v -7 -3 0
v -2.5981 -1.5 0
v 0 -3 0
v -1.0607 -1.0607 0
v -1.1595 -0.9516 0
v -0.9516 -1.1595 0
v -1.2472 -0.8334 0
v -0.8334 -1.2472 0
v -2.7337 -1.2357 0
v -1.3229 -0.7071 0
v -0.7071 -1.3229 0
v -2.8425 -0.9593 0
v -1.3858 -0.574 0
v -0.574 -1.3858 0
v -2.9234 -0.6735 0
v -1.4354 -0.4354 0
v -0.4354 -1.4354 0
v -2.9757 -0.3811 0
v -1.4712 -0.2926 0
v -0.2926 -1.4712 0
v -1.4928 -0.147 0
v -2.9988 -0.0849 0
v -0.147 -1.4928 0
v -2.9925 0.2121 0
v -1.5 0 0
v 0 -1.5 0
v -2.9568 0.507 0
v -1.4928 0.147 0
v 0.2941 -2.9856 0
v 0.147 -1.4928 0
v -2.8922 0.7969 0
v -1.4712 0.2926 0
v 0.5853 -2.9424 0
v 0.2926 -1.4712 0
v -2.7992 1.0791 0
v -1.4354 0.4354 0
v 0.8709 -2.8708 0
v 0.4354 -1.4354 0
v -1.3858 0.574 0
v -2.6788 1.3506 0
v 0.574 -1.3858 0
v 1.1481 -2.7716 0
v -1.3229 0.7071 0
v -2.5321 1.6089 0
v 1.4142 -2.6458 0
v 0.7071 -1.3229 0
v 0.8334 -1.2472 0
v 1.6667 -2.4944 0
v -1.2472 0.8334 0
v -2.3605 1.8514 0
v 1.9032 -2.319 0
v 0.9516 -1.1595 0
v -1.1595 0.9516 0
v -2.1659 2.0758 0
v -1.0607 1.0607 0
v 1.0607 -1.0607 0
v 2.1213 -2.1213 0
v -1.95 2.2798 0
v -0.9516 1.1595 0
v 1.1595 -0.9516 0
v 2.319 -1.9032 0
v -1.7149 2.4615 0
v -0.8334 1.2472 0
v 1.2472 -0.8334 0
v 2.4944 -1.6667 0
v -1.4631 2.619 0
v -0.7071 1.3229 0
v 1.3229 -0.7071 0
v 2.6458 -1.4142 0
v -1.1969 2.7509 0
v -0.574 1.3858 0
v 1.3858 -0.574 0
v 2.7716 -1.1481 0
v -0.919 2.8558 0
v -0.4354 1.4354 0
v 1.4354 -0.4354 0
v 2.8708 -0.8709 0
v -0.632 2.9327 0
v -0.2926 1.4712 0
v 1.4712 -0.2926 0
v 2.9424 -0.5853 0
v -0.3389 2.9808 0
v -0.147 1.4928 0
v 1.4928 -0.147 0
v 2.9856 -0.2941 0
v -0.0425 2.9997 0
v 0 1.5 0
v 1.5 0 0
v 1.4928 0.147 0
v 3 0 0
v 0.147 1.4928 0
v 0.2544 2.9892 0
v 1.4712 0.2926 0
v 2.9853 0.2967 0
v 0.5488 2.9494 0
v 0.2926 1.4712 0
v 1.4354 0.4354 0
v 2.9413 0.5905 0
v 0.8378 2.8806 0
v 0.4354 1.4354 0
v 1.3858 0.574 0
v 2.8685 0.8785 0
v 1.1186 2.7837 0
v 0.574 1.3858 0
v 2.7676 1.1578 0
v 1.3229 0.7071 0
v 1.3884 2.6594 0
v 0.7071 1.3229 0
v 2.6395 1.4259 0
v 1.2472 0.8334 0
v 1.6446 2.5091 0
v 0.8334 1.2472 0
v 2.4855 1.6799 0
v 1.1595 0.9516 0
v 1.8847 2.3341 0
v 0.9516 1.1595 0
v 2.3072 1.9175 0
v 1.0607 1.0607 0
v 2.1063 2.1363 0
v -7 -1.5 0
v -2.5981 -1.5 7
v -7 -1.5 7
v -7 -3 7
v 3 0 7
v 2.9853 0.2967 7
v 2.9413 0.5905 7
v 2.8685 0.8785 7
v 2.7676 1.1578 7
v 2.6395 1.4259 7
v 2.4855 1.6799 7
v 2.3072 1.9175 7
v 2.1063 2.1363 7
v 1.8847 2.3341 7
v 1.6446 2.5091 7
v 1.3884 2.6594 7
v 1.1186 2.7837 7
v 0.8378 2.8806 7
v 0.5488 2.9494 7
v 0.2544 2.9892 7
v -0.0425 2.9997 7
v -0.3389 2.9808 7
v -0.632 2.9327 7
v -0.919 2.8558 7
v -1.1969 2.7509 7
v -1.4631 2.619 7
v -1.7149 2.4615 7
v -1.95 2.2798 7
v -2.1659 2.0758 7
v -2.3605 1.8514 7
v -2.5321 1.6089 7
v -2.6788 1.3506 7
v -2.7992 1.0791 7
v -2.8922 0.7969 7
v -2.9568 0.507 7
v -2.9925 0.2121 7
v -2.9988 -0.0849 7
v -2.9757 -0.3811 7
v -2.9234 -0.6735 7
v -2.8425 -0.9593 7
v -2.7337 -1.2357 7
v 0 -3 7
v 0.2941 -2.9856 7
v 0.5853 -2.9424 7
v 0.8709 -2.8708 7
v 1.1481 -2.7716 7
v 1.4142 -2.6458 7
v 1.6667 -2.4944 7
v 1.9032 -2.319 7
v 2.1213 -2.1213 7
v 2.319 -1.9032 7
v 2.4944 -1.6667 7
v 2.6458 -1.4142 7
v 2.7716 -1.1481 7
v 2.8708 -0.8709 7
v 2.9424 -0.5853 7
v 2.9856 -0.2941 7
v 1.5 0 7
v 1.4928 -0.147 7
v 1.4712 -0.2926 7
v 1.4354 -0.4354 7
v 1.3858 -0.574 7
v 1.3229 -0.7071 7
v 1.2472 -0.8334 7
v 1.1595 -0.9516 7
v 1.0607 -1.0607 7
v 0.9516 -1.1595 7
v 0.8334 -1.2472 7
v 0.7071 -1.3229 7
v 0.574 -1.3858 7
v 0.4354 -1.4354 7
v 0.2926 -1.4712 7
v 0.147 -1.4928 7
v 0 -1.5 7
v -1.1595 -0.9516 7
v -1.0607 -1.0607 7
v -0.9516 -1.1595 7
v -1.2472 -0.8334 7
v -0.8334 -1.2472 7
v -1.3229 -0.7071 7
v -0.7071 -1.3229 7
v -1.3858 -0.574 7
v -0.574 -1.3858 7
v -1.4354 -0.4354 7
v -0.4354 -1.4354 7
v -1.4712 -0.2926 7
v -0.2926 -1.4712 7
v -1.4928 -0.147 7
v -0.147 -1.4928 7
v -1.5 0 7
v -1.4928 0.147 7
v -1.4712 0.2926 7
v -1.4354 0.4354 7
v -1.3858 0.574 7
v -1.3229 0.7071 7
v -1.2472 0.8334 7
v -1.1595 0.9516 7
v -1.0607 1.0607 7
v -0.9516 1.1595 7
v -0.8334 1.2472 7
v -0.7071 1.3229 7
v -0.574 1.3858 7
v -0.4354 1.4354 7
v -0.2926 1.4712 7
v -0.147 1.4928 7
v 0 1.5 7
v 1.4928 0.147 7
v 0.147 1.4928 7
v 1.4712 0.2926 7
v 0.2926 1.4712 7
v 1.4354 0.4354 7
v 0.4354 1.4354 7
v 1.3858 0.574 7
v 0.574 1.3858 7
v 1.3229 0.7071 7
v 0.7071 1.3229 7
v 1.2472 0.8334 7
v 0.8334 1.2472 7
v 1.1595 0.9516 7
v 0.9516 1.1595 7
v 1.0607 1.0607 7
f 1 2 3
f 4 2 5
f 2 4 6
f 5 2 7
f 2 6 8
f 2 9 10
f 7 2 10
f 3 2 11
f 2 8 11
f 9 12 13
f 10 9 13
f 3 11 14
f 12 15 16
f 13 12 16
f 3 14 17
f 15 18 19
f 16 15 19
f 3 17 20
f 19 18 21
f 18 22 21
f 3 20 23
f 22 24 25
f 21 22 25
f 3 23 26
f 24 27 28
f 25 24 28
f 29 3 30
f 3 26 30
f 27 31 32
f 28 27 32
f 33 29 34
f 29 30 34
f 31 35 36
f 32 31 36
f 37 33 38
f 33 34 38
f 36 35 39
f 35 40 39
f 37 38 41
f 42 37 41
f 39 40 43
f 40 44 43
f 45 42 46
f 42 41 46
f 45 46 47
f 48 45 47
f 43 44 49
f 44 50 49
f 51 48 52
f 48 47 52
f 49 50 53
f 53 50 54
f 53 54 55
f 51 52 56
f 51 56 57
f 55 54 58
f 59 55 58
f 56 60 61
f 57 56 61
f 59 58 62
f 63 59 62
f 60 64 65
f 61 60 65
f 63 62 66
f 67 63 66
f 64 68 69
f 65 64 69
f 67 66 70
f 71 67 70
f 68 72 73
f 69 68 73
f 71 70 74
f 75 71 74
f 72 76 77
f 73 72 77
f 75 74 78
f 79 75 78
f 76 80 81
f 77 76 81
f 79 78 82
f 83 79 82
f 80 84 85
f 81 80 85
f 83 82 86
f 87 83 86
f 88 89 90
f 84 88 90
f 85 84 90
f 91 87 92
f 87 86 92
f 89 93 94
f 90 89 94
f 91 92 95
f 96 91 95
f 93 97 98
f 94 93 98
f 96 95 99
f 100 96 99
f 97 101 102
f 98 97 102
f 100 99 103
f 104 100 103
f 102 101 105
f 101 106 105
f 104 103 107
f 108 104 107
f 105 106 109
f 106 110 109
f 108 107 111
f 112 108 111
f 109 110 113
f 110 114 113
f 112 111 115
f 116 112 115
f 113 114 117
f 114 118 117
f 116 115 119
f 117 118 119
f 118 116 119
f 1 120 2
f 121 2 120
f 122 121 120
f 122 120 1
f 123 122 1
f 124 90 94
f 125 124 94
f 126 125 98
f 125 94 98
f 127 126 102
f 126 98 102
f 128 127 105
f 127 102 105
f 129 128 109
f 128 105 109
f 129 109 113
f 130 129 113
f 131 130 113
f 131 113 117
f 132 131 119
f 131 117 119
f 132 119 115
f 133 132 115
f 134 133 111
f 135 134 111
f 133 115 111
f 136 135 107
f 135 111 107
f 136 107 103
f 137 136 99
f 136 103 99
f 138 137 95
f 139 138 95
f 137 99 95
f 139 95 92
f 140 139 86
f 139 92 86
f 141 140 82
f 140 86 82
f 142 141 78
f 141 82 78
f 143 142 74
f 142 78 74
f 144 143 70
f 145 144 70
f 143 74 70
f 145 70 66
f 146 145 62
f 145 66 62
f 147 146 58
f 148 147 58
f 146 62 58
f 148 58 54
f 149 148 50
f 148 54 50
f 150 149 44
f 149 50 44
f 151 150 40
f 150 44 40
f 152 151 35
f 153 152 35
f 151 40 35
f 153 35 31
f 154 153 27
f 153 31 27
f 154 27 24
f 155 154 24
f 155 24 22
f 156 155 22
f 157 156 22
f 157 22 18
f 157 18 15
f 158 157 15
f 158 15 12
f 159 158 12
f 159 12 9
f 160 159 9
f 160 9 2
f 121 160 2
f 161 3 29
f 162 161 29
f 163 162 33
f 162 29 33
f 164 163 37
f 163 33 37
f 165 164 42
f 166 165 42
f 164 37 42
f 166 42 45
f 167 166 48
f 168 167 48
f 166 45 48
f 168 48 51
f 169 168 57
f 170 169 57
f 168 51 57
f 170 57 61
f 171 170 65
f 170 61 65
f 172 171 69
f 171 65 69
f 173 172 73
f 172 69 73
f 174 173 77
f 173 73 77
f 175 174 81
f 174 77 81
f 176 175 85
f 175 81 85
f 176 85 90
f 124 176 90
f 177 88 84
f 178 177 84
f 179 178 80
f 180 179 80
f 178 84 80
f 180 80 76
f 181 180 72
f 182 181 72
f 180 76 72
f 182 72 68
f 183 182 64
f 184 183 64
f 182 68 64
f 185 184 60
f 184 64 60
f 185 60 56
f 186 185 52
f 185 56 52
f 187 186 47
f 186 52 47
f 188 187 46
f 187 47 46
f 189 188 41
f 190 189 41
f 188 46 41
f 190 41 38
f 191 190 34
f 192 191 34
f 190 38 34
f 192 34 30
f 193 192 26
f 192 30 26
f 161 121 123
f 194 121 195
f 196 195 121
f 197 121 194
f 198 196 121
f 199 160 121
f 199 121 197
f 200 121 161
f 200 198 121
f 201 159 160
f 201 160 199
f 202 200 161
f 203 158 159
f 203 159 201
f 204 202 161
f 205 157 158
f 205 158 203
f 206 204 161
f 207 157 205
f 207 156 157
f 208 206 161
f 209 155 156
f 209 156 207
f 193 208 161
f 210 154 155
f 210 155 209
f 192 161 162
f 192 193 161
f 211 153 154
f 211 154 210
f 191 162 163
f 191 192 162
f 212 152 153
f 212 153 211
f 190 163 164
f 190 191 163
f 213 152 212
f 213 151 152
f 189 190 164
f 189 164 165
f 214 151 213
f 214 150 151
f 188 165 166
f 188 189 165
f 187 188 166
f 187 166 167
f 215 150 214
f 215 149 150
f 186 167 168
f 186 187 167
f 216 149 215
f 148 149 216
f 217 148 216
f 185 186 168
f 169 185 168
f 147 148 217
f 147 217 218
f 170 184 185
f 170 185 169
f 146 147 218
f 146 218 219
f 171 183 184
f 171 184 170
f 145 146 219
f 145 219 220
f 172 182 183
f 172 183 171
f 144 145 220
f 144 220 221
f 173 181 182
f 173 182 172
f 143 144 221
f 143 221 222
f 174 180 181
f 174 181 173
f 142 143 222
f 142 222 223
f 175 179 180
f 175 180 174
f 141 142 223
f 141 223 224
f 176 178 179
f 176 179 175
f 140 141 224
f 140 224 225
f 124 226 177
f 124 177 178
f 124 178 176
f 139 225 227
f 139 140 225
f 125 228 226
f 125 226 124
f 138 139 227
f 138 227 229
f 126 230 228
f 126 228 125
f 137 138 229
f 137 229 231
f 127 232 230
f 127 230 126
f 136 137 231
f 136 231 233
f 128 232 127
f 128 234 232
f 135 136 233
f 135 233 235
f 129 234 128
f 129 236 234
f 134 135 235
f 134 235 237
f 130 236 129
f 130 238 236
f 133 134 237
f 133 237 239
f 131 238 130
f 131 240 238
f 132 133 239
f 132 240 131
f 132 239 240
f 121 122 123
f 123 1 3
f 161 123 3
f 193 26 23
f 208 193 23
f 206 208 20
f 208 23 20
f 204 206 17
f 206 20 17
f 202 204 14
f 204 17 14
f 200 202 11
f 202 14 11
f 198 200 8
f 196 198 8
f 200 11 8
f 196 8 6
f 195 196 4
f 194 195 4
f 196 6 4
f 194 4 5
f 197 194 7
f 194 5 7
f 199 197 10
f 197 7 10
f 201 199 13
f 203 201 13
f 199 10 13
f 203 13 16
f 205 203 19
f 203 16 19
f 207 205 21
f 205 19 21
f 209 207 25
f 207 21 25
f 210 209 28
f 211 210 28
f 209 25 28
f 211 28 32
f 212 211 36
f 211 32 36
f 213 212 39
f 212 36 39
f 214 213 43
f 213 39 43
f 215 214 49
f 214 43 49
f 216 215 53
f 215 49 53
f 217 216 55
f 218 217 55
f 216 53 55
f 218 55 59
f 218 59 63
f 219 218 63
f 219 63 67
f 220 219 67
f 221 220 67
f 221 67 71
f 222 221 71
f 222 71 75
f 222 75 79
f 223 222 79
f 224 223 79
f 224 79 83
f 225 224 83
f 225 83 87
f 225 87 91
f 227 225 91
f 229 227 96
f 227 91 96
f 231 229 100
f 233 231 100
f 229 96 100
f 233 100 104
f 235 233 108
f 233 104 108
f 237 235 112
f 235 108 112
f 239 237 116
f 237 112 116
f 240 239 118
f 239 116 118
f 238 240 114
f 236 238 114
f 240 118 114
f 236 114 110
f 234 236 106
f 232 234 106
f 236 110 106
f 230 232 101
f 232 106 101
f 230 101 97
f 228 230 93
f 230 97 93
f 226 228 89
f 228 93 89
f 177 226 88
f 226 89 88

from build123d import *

# Parameters (mm, degrees)
F1_DEPTH = 7


with BuildPart() as f1:
    # F0 (on Top) → F1 (new body)
    with BuildSketch(Plane.XY):
        with BuildLine():
            Line((-7, -3), (0, -3))
            ThreePointArc((0, -3), (-1.5, -2.5980762114), (-2.5980762114, -1.5))
            Line((-2.5980762114, -1.5), (-7, -1.5))
            Line((-7, -1.5), (-7, -3))
        make_face()
        with BuildLine():
            Line((-2.5980762114, -1.5), (0, -1.5))
            Line((0, -1.5), (0, -3))
            ThreePointArc((0, -3), (2.1213203436, -2.1213203436), (3, 0))
            ThreePointArc((3, 0), (-0.7764571353, 2.8977774789), (-2.5980762114, -1.5))
        make_face()
        with BuildLine():
            ThreePointArc((0, -1.5), (-1.0606601718, 1.0606601718), (1.5, 0))
            ThreePointArc((1.5, 0), (1.0606601718, -1.0606601718), (0, -1.5))
        make_face(mode=Mode.SUBTRACT)
        with BuildLine():
            Line((0, -3), (0, -1.5))
            Line((0, -1.5), (-2.5980762114, -1.5))
            ThreePointArc((-2.5980762114, -1.5), (-1.5, -2.5980762114), (0, -3))
        make_face()
    extrude(amount=F1_DEPTH)


solid = f1.part
